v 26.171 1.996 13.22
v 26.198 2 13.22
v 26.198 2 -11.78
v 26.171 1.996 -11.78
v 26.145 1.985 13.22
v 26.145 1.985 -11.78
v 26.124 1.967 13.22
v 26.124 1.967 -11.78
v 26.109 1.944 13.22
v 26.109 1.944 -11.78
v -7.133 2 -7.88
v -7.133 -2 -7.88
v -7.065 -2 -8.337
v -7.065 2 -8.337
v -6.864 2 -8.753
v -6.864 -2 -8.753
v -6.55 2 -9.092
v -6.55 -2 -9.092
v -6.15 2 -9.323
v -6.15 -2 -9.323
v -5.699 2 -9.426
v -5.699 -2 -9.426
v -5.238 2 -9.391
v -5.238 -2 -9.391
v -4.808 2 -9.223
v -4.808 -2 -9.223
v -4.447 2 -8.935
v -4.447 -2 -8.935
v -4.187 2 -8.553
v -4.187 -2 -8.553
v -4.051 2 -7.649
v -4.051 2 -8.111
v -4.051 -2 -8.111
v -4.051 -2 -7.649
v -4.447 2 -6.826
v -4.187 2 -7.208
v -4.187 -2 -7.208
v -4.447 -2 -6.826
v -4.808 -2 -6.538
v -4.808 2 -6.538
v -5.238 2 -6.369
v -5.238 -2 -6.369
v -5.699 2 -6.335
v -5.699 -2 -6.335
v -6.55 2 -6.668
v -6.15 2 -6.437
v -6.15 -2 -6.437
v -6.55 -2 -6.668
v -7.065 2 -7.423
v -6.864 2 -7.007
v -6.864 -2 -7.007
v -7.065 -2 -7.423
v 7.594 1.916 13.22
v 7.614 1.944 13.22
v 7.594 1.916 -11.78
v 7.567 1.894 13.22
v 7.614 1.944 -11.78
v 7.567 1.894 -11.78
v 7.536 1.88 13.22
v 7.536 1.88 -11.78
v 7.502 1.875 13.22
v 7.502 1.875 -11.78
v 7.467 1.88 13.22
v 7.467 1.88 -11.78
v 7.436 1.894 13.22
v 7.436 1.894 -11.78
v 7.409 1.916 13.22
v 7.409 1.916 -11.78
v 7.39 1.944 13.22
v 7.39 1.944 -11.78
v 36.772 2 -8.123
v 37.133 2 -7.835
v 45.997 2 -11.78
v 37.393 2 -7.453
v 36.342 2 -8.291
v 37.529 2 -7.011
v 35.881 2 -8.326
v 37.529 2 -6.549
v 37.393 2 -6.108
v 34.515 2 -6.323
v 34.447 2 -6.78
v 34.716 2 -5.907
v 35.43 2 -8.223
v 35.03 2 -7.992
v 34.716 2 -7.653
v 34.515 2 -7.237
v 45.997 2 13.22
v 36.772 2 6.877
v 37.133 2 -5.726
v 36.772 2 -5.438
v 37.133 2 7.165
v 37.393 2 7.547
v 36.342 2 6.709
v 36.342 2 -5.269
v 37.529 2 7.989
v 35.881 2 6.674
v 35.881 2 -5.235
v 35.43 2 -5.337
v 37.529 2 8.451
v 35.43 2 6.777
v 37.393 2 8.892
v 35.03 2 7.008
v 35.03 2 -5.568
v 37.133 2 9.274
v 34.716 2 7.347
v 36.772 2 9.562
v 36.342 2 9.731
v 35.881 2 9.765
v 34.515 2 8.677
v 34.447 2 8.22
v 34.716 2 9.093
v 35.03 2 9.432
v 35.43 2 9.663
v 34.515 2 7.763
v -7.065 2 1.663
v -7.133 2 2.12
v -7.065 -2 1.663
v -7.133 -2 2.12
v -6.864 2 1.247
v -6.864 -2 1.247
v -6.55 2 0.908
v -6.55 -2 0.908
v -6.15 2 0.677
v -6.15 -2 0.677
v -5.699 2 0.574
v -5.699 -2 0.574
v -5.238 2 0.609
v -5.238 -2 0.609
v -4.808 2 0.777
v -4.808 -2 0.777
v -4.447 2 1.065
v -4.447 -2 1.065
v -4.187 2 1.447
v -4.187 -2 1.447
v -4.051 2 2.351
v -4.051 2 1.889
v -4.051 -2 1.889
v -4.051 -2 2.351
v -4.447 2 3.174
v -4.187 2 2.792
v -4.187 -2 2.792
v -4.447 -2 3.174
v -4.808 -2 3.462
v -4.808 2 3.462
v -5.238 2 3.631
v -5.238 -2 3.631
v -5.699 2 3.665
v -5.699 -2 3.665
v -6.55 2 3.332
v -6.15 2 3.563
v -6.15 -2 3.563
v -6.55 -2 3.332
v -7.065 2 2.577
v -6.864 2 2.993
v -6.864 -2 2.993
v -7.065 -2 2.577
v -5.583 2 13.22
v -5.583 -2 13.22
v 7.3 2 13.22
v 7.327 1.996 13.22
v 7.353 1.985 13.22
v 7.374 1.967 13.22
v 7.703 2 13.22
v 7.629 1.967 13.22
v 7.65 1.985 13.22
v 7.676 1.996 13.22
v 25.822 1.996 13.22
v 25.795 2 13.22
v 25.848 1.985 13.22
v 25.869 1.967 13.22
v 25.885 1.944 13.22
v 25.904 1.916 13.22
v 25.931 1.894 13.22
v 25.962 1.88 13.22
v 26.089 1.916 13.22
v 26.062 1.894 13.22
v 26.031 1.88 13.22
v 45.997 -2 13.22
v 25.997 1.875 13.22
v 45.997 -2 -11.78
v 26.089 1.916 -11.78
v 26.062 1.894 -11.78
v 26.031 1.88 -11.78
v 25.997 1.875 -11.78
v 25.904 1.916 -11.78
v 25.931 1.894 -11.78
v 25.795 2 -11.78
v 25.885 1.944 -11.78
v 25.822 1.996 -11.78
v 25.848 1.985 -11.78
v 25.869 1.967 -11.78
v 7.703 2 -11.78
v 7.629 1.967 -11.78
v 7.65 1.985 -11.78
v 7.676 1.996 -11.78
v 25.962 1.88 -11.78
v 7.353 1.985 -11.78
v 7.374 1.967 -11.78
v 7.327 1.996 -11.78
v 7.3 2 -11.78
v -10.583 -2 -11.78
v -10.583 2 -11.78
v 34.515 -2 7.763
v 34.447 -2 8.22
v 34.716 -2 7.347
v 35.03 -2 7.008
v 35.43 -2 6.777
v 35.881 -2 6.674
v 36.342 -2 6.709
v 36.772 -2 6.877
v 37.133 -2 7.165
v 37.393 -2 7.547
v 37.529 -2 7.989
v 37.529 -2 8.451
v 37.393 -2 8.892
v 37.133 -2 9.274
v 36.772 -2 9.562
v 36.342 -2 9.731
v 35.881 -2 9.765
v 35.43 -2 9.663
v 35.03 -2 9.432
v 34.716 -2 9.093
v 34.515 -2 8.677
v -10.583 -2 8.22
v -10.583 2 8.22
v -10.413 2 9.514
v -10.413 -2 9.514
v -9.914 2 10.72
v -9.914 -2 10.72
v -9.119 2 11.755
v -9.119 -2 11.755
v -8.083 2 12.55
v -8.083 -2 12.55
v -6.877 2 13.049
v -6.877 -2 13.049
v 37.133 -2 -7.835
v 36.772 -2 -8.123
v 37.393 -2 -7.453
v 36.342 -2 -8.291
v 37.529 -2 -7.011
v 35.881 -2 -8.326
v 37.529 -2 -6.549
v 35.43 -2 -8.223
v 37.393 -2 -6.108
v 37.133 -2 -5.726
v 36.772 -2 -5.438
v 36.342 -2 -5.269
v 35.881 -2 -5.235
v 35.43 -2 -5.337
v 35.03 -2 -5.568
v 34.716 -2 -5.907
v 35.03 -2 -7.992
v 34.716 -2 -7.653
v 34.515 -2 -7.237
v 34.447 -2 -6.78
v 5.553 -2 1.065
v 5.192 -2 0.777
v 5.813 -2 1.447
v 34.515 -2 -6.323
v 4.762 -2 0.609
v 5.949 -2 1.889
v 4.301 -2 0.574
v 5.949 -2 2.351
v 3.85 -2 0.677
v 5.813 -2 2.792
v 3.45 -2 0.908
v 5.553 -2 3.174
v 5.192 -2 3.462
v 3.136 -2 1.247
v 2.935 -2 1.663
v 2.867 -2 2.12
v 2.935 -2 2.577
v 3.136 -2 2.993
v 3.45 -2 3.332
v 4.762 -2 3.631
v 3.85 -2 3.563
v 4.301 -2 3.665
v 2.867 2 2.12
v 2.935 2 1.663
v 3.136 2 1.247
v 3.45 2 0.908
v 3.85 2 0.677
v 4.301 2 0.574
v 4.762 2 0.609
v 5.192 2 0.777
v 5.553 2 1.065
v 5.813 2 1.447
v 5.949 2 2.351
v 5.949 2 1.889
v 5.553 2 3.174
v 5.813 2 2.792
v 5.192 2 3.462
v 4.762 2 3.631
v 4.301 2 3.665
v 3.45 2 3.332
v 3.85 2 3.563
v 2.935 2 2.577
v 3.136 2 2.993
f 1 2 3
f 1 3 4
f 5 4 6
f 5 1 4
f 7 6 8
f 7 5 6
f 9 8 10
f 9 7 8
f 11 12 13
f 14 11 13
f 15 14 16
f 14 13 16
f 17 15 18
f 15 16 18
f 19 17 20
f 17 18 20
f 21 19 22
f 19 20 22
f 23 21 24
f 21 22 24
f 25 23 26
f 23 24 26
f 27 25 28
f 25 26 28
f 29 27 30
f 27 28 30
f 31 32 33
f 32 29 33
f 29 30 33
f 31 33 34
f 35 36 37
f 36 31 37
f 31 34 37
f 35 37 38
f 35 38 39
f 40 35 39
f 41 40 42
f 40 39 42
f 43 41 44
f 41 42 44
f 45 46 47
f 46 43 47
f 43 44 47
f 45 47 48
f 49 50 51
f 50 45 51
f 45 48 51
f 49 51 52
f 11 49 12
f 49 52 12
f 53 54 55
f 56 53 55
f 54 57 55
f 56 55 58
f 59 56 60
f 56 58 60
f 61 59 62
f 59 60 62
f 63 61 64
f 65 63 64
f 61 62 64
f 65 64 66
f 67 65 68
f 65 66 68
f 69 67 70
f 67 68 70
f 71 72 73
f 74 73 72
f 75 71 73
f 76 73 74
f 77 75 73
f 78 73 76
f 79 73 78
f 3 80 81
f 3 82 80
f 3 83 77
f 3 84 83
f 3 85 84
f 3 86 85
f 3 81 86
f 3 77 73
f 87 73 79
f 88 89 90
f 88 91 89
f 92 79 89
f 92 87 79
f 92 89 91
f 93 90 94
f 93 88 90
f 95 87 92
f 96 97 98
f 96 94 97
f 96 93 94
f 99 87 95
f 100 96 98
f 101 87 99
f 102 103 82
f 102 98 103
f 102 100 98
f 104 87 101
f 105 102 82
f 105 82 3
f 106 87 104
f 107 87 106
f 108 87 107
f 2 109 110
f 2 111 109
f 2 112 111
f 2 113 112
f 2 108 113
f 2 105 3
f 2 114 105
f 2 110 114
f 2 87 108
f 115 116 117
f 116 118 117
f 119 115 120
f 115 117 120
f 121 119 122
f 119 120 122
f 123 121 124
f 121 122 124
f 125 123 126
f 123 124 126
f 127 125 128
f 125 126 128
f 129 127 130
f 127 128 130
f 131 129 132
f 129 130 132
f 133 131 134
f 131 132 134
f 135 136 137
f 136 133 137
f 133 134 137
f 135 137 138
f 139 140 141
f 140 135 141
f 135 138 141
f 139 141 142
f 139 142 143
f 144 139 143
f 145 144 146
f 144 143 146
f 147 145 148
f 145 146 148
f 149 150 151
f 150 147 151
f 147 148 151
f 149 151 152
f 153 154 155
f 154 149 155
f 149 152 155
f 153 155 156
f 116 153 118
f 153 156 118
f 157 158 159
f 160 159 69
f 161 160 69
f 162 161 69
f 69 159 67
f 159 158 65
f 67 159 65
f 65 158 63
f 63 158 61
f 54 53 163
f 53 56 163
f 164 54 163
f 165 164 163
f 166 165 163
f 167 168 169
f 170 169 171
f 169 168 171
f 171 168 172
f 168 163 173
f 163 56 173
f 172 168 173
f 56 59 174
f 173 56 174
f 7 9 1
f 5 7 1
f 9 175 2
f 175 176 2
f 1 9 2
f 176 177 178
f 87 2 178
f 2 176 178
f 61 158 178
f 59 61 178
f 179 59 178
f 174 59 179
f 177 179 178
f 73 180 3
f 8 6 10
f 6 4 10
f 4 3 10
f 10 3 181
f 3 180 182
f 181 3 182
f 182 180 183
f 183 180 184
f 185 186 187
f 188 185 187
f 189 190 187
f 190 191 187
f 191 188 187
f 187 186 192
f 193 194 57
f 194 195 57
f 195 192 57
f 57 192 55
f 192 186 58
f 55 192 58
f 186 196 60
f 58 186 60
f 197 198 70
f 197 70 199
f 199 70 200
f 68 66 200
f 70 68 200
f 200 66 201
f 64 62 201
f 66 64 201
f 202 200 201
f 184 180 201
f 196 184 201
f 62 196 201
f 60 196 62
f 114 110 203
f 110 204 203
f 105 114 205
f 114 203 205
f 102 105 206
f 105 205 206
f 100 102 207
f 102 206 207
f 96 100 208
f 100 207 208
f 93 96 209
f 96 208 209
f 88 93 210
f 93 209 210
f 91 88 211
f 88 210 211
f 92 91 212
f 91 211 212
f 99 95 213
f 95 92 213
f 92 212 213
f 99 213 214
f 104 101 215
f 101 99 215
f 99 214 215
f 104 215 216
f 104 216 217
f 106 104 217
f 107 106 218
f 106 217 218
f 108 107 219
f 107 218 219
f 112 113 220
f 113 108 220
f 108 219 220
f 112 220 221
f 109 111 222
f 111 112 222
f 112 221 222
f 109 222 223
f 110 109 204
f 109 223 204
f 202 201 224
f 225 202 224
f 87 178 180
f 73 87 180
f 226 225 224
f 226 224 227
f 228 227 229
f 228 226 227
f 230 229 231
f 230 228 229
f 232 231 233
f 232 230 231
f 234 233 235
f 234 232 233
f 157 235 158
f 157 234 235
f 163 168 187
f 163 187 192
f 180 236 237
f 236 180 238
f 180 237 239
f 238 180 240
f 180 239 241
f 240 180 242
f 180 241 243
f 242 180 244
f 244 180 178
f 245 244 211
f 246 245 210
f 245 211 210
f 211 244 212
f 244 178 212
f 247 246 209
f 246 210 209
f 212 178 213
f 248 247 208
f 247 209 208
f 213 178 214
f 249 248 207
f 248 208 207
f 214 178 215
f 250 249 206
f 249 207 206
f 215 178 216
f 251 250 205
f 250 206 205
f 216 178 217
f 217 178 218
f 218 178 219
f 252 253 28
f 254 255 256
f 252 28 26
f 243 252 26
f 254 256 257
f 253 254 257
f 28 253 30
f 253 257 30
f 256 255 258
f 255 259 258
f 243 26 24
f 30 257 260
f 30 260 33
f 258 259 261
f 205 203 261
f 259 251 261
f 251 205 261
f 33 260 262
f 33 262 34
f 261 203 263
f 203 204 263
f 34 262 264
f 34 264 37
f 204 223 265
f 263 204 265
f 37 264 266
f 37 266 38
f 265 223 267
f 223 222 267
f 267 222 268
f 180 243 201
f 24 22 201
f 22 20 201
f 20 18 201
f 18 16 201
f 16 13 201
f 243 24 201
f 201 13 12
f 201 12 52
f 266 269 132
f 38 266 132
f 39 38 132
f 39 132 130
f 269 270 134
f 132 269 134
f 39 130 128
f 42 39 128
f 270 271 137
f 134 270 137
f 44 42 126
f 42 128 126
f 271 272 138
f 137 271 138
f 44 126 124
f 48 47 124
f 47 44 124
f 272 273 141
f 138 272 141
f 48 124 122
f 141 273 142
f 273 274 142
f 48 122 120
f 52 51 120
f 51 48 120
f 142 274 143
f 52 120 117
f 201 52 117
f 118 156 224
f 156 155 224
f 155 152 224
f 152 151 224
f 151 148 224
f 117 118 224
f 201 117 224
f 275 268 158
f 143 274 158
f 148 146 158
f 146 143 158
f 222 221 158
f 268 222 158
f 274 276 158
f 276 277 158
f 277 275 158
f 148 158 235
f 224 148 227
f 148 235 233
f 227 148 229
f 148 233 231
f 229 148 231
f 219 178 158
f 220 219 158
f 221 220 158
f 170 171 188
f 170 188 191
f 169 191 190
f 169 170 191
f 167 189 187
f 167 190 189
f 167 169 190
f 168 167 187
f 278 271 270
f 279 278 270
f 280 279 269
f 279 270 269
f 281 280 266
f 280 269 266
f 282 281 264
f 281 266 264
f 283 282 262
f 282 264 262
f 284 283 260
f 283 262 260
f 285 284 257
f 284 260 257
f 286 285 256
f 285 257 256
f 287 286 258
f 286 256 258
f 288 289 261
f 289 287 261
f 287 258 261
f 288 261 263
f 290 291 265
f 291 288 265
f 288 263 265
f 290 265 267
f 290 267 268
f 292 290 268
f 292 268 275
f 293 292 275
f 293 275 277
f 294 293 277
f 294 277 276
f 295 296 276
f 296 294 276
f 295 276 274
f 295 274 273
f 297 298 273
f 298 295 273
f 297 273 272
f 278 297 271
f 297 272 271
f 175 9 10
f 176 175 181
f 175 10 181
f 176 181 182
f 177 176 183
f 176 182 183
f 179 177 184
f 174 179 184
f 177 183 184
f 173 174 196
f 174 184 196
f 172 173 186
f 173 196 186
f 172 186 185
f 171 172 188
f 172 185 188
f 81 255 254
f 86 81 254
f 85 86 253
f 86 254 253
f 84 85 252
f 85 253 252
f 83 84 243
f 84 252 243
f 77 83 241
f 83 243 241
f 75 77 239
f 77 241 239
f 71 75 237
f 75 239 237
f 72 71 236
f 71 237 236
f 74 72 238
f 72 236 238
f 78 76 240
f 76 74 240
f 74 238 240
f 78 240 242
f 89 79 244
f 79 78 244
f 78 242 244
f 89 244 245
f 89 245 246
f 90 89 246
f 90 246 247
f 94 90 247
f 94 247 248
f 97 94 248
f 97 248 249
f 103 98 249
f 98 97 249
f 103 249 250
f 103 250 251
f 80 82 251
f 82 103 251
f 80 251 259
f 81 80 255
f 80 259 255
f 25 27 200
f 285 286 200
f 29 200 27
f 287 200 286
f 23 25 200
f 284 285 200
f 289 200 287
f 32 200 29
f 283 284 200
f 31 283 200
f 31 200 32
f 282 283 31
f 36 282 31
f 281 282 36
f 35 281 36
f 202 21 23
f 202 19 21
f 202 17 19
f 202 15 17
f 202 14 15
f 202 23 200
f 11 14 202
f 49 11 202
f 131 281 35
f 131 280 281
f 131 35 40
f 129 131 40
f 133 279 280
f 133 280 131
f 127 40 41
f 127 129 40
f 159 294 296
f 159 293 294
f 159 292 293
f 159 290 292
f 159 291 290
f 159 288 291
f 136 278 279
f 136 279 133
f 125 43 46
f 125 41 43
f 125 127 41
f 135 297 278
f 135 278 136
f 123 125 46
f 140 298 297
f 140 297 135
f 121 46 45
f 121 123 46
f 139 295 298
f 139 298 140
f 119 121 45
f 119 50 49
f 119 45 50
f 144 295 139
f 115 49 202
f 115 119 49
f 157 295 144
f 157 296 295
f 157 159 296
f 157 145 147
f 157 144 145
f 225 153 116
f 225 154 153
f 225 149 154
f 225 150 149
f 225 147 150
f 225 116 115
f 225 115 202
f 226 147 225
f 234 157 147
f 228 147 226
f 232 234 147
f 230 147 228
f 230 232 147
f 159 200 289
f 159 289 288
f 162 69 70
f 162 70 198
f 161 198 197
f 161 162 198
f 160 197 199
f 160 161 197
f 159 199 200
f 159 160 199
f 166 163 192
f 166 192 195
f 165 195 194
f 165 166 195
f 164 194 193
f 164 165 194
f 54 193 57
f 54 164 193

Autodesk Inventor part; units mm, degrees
ref_plane "YZ Plane" through (0, 0, 0) normal (1, 0, 0) x (0, 1, 0)
ref_plane "XZ Plane" through (0, 0, 0) normal (0, 1, 0) x (-1, 0, 0)
ref_plane "XY Plane" through (0, 0, 0) normal (0, 0, 1) x (1, 0, 0)
sketch "Sketch1" plane through (0, 0, 0) normal (0, 1, 0) x (-1, 0, 0)
  line L0 (10.5834, 13.2197) -> (-45.9966, 13.2197)
  line L1 (-45.9966, 13.2197) -> (-45.9966, -11.7803)
  line L2 (-45.9966, -11.7803) -> (10.5834, -11.7803)
  line L3 (10.5834, -11.7803) -> (10.5834, 13.2197)
  circle A0 centre (5.5834, -7.8803) radius 1.55
  circle A1 centre (5.5834, 2.1197) radius 1.55
  circle A2 centre (-4.4166, 2.1197) radius 1.55
  circle A3 centre (-35.9966, 8.2197) radius 1.55
  circle A4 centre (-35.9966, -6.7803) radius 1.55
  point P0 (0, 0)
  dimension "d0" = 3.1
  dimension "d1" = 3.9
  dimension "d4" = 10
  dimension "d11" = 10
  dimension "d16" = 25
  dimension "d17" = 5
  dimension "d18" = 56.58
  dimension "d19" = 3.1
  dimension "d20" = 10
  dimension "d23" = 15
  dimension "d28" = 5
extrude "Extrusion1" add sketch "Sketch1" along normal mid plane 4
sketch "Sketch2" plane through (45.9966, 2, -11.7803) normal (0, 0, -1) x (-1, 0, 0)
  arc A0 (38.37, 0) -> (38.62, 0) centre (38.495, 0) ccw
  line L0 (0, 0) -> (56.58, 0) projected
  line L1 (56.58, -4) -> (56.58, 0) projected
  circle A1 centre (20, 0) radius 0.125
  line L2 (0, -4) -> (0, 0) projected
  point P0 (45.9966, -2)
  point P1 (56.58, -2)
  point P2 (20.125, 0)
  point P3 (19.875, 0)
  dimension "d31" = 0.25
  dimension "d34" = 18.085
  dimension "d35" = 0.25
  dimension "d36" = 20
extrude "Extrusion2" cut sketch "Sketch2" against normal up to surface (25 mm away) contours L0 A0 | A1 L0 picked at (20, -0.0736)
fillet "Fillet1" radius 0.1 4 edges at (7.6266, 2, 0.7197) (7.3766, 2, 0.7197) (26.1216, 2, 0.7197) (25.8716, 2, 0.7197)
fillet "Fillet2" radius 5 1 edges at (-10.5834, 0, 13.2197)
properties part number "GVS_Plate"
